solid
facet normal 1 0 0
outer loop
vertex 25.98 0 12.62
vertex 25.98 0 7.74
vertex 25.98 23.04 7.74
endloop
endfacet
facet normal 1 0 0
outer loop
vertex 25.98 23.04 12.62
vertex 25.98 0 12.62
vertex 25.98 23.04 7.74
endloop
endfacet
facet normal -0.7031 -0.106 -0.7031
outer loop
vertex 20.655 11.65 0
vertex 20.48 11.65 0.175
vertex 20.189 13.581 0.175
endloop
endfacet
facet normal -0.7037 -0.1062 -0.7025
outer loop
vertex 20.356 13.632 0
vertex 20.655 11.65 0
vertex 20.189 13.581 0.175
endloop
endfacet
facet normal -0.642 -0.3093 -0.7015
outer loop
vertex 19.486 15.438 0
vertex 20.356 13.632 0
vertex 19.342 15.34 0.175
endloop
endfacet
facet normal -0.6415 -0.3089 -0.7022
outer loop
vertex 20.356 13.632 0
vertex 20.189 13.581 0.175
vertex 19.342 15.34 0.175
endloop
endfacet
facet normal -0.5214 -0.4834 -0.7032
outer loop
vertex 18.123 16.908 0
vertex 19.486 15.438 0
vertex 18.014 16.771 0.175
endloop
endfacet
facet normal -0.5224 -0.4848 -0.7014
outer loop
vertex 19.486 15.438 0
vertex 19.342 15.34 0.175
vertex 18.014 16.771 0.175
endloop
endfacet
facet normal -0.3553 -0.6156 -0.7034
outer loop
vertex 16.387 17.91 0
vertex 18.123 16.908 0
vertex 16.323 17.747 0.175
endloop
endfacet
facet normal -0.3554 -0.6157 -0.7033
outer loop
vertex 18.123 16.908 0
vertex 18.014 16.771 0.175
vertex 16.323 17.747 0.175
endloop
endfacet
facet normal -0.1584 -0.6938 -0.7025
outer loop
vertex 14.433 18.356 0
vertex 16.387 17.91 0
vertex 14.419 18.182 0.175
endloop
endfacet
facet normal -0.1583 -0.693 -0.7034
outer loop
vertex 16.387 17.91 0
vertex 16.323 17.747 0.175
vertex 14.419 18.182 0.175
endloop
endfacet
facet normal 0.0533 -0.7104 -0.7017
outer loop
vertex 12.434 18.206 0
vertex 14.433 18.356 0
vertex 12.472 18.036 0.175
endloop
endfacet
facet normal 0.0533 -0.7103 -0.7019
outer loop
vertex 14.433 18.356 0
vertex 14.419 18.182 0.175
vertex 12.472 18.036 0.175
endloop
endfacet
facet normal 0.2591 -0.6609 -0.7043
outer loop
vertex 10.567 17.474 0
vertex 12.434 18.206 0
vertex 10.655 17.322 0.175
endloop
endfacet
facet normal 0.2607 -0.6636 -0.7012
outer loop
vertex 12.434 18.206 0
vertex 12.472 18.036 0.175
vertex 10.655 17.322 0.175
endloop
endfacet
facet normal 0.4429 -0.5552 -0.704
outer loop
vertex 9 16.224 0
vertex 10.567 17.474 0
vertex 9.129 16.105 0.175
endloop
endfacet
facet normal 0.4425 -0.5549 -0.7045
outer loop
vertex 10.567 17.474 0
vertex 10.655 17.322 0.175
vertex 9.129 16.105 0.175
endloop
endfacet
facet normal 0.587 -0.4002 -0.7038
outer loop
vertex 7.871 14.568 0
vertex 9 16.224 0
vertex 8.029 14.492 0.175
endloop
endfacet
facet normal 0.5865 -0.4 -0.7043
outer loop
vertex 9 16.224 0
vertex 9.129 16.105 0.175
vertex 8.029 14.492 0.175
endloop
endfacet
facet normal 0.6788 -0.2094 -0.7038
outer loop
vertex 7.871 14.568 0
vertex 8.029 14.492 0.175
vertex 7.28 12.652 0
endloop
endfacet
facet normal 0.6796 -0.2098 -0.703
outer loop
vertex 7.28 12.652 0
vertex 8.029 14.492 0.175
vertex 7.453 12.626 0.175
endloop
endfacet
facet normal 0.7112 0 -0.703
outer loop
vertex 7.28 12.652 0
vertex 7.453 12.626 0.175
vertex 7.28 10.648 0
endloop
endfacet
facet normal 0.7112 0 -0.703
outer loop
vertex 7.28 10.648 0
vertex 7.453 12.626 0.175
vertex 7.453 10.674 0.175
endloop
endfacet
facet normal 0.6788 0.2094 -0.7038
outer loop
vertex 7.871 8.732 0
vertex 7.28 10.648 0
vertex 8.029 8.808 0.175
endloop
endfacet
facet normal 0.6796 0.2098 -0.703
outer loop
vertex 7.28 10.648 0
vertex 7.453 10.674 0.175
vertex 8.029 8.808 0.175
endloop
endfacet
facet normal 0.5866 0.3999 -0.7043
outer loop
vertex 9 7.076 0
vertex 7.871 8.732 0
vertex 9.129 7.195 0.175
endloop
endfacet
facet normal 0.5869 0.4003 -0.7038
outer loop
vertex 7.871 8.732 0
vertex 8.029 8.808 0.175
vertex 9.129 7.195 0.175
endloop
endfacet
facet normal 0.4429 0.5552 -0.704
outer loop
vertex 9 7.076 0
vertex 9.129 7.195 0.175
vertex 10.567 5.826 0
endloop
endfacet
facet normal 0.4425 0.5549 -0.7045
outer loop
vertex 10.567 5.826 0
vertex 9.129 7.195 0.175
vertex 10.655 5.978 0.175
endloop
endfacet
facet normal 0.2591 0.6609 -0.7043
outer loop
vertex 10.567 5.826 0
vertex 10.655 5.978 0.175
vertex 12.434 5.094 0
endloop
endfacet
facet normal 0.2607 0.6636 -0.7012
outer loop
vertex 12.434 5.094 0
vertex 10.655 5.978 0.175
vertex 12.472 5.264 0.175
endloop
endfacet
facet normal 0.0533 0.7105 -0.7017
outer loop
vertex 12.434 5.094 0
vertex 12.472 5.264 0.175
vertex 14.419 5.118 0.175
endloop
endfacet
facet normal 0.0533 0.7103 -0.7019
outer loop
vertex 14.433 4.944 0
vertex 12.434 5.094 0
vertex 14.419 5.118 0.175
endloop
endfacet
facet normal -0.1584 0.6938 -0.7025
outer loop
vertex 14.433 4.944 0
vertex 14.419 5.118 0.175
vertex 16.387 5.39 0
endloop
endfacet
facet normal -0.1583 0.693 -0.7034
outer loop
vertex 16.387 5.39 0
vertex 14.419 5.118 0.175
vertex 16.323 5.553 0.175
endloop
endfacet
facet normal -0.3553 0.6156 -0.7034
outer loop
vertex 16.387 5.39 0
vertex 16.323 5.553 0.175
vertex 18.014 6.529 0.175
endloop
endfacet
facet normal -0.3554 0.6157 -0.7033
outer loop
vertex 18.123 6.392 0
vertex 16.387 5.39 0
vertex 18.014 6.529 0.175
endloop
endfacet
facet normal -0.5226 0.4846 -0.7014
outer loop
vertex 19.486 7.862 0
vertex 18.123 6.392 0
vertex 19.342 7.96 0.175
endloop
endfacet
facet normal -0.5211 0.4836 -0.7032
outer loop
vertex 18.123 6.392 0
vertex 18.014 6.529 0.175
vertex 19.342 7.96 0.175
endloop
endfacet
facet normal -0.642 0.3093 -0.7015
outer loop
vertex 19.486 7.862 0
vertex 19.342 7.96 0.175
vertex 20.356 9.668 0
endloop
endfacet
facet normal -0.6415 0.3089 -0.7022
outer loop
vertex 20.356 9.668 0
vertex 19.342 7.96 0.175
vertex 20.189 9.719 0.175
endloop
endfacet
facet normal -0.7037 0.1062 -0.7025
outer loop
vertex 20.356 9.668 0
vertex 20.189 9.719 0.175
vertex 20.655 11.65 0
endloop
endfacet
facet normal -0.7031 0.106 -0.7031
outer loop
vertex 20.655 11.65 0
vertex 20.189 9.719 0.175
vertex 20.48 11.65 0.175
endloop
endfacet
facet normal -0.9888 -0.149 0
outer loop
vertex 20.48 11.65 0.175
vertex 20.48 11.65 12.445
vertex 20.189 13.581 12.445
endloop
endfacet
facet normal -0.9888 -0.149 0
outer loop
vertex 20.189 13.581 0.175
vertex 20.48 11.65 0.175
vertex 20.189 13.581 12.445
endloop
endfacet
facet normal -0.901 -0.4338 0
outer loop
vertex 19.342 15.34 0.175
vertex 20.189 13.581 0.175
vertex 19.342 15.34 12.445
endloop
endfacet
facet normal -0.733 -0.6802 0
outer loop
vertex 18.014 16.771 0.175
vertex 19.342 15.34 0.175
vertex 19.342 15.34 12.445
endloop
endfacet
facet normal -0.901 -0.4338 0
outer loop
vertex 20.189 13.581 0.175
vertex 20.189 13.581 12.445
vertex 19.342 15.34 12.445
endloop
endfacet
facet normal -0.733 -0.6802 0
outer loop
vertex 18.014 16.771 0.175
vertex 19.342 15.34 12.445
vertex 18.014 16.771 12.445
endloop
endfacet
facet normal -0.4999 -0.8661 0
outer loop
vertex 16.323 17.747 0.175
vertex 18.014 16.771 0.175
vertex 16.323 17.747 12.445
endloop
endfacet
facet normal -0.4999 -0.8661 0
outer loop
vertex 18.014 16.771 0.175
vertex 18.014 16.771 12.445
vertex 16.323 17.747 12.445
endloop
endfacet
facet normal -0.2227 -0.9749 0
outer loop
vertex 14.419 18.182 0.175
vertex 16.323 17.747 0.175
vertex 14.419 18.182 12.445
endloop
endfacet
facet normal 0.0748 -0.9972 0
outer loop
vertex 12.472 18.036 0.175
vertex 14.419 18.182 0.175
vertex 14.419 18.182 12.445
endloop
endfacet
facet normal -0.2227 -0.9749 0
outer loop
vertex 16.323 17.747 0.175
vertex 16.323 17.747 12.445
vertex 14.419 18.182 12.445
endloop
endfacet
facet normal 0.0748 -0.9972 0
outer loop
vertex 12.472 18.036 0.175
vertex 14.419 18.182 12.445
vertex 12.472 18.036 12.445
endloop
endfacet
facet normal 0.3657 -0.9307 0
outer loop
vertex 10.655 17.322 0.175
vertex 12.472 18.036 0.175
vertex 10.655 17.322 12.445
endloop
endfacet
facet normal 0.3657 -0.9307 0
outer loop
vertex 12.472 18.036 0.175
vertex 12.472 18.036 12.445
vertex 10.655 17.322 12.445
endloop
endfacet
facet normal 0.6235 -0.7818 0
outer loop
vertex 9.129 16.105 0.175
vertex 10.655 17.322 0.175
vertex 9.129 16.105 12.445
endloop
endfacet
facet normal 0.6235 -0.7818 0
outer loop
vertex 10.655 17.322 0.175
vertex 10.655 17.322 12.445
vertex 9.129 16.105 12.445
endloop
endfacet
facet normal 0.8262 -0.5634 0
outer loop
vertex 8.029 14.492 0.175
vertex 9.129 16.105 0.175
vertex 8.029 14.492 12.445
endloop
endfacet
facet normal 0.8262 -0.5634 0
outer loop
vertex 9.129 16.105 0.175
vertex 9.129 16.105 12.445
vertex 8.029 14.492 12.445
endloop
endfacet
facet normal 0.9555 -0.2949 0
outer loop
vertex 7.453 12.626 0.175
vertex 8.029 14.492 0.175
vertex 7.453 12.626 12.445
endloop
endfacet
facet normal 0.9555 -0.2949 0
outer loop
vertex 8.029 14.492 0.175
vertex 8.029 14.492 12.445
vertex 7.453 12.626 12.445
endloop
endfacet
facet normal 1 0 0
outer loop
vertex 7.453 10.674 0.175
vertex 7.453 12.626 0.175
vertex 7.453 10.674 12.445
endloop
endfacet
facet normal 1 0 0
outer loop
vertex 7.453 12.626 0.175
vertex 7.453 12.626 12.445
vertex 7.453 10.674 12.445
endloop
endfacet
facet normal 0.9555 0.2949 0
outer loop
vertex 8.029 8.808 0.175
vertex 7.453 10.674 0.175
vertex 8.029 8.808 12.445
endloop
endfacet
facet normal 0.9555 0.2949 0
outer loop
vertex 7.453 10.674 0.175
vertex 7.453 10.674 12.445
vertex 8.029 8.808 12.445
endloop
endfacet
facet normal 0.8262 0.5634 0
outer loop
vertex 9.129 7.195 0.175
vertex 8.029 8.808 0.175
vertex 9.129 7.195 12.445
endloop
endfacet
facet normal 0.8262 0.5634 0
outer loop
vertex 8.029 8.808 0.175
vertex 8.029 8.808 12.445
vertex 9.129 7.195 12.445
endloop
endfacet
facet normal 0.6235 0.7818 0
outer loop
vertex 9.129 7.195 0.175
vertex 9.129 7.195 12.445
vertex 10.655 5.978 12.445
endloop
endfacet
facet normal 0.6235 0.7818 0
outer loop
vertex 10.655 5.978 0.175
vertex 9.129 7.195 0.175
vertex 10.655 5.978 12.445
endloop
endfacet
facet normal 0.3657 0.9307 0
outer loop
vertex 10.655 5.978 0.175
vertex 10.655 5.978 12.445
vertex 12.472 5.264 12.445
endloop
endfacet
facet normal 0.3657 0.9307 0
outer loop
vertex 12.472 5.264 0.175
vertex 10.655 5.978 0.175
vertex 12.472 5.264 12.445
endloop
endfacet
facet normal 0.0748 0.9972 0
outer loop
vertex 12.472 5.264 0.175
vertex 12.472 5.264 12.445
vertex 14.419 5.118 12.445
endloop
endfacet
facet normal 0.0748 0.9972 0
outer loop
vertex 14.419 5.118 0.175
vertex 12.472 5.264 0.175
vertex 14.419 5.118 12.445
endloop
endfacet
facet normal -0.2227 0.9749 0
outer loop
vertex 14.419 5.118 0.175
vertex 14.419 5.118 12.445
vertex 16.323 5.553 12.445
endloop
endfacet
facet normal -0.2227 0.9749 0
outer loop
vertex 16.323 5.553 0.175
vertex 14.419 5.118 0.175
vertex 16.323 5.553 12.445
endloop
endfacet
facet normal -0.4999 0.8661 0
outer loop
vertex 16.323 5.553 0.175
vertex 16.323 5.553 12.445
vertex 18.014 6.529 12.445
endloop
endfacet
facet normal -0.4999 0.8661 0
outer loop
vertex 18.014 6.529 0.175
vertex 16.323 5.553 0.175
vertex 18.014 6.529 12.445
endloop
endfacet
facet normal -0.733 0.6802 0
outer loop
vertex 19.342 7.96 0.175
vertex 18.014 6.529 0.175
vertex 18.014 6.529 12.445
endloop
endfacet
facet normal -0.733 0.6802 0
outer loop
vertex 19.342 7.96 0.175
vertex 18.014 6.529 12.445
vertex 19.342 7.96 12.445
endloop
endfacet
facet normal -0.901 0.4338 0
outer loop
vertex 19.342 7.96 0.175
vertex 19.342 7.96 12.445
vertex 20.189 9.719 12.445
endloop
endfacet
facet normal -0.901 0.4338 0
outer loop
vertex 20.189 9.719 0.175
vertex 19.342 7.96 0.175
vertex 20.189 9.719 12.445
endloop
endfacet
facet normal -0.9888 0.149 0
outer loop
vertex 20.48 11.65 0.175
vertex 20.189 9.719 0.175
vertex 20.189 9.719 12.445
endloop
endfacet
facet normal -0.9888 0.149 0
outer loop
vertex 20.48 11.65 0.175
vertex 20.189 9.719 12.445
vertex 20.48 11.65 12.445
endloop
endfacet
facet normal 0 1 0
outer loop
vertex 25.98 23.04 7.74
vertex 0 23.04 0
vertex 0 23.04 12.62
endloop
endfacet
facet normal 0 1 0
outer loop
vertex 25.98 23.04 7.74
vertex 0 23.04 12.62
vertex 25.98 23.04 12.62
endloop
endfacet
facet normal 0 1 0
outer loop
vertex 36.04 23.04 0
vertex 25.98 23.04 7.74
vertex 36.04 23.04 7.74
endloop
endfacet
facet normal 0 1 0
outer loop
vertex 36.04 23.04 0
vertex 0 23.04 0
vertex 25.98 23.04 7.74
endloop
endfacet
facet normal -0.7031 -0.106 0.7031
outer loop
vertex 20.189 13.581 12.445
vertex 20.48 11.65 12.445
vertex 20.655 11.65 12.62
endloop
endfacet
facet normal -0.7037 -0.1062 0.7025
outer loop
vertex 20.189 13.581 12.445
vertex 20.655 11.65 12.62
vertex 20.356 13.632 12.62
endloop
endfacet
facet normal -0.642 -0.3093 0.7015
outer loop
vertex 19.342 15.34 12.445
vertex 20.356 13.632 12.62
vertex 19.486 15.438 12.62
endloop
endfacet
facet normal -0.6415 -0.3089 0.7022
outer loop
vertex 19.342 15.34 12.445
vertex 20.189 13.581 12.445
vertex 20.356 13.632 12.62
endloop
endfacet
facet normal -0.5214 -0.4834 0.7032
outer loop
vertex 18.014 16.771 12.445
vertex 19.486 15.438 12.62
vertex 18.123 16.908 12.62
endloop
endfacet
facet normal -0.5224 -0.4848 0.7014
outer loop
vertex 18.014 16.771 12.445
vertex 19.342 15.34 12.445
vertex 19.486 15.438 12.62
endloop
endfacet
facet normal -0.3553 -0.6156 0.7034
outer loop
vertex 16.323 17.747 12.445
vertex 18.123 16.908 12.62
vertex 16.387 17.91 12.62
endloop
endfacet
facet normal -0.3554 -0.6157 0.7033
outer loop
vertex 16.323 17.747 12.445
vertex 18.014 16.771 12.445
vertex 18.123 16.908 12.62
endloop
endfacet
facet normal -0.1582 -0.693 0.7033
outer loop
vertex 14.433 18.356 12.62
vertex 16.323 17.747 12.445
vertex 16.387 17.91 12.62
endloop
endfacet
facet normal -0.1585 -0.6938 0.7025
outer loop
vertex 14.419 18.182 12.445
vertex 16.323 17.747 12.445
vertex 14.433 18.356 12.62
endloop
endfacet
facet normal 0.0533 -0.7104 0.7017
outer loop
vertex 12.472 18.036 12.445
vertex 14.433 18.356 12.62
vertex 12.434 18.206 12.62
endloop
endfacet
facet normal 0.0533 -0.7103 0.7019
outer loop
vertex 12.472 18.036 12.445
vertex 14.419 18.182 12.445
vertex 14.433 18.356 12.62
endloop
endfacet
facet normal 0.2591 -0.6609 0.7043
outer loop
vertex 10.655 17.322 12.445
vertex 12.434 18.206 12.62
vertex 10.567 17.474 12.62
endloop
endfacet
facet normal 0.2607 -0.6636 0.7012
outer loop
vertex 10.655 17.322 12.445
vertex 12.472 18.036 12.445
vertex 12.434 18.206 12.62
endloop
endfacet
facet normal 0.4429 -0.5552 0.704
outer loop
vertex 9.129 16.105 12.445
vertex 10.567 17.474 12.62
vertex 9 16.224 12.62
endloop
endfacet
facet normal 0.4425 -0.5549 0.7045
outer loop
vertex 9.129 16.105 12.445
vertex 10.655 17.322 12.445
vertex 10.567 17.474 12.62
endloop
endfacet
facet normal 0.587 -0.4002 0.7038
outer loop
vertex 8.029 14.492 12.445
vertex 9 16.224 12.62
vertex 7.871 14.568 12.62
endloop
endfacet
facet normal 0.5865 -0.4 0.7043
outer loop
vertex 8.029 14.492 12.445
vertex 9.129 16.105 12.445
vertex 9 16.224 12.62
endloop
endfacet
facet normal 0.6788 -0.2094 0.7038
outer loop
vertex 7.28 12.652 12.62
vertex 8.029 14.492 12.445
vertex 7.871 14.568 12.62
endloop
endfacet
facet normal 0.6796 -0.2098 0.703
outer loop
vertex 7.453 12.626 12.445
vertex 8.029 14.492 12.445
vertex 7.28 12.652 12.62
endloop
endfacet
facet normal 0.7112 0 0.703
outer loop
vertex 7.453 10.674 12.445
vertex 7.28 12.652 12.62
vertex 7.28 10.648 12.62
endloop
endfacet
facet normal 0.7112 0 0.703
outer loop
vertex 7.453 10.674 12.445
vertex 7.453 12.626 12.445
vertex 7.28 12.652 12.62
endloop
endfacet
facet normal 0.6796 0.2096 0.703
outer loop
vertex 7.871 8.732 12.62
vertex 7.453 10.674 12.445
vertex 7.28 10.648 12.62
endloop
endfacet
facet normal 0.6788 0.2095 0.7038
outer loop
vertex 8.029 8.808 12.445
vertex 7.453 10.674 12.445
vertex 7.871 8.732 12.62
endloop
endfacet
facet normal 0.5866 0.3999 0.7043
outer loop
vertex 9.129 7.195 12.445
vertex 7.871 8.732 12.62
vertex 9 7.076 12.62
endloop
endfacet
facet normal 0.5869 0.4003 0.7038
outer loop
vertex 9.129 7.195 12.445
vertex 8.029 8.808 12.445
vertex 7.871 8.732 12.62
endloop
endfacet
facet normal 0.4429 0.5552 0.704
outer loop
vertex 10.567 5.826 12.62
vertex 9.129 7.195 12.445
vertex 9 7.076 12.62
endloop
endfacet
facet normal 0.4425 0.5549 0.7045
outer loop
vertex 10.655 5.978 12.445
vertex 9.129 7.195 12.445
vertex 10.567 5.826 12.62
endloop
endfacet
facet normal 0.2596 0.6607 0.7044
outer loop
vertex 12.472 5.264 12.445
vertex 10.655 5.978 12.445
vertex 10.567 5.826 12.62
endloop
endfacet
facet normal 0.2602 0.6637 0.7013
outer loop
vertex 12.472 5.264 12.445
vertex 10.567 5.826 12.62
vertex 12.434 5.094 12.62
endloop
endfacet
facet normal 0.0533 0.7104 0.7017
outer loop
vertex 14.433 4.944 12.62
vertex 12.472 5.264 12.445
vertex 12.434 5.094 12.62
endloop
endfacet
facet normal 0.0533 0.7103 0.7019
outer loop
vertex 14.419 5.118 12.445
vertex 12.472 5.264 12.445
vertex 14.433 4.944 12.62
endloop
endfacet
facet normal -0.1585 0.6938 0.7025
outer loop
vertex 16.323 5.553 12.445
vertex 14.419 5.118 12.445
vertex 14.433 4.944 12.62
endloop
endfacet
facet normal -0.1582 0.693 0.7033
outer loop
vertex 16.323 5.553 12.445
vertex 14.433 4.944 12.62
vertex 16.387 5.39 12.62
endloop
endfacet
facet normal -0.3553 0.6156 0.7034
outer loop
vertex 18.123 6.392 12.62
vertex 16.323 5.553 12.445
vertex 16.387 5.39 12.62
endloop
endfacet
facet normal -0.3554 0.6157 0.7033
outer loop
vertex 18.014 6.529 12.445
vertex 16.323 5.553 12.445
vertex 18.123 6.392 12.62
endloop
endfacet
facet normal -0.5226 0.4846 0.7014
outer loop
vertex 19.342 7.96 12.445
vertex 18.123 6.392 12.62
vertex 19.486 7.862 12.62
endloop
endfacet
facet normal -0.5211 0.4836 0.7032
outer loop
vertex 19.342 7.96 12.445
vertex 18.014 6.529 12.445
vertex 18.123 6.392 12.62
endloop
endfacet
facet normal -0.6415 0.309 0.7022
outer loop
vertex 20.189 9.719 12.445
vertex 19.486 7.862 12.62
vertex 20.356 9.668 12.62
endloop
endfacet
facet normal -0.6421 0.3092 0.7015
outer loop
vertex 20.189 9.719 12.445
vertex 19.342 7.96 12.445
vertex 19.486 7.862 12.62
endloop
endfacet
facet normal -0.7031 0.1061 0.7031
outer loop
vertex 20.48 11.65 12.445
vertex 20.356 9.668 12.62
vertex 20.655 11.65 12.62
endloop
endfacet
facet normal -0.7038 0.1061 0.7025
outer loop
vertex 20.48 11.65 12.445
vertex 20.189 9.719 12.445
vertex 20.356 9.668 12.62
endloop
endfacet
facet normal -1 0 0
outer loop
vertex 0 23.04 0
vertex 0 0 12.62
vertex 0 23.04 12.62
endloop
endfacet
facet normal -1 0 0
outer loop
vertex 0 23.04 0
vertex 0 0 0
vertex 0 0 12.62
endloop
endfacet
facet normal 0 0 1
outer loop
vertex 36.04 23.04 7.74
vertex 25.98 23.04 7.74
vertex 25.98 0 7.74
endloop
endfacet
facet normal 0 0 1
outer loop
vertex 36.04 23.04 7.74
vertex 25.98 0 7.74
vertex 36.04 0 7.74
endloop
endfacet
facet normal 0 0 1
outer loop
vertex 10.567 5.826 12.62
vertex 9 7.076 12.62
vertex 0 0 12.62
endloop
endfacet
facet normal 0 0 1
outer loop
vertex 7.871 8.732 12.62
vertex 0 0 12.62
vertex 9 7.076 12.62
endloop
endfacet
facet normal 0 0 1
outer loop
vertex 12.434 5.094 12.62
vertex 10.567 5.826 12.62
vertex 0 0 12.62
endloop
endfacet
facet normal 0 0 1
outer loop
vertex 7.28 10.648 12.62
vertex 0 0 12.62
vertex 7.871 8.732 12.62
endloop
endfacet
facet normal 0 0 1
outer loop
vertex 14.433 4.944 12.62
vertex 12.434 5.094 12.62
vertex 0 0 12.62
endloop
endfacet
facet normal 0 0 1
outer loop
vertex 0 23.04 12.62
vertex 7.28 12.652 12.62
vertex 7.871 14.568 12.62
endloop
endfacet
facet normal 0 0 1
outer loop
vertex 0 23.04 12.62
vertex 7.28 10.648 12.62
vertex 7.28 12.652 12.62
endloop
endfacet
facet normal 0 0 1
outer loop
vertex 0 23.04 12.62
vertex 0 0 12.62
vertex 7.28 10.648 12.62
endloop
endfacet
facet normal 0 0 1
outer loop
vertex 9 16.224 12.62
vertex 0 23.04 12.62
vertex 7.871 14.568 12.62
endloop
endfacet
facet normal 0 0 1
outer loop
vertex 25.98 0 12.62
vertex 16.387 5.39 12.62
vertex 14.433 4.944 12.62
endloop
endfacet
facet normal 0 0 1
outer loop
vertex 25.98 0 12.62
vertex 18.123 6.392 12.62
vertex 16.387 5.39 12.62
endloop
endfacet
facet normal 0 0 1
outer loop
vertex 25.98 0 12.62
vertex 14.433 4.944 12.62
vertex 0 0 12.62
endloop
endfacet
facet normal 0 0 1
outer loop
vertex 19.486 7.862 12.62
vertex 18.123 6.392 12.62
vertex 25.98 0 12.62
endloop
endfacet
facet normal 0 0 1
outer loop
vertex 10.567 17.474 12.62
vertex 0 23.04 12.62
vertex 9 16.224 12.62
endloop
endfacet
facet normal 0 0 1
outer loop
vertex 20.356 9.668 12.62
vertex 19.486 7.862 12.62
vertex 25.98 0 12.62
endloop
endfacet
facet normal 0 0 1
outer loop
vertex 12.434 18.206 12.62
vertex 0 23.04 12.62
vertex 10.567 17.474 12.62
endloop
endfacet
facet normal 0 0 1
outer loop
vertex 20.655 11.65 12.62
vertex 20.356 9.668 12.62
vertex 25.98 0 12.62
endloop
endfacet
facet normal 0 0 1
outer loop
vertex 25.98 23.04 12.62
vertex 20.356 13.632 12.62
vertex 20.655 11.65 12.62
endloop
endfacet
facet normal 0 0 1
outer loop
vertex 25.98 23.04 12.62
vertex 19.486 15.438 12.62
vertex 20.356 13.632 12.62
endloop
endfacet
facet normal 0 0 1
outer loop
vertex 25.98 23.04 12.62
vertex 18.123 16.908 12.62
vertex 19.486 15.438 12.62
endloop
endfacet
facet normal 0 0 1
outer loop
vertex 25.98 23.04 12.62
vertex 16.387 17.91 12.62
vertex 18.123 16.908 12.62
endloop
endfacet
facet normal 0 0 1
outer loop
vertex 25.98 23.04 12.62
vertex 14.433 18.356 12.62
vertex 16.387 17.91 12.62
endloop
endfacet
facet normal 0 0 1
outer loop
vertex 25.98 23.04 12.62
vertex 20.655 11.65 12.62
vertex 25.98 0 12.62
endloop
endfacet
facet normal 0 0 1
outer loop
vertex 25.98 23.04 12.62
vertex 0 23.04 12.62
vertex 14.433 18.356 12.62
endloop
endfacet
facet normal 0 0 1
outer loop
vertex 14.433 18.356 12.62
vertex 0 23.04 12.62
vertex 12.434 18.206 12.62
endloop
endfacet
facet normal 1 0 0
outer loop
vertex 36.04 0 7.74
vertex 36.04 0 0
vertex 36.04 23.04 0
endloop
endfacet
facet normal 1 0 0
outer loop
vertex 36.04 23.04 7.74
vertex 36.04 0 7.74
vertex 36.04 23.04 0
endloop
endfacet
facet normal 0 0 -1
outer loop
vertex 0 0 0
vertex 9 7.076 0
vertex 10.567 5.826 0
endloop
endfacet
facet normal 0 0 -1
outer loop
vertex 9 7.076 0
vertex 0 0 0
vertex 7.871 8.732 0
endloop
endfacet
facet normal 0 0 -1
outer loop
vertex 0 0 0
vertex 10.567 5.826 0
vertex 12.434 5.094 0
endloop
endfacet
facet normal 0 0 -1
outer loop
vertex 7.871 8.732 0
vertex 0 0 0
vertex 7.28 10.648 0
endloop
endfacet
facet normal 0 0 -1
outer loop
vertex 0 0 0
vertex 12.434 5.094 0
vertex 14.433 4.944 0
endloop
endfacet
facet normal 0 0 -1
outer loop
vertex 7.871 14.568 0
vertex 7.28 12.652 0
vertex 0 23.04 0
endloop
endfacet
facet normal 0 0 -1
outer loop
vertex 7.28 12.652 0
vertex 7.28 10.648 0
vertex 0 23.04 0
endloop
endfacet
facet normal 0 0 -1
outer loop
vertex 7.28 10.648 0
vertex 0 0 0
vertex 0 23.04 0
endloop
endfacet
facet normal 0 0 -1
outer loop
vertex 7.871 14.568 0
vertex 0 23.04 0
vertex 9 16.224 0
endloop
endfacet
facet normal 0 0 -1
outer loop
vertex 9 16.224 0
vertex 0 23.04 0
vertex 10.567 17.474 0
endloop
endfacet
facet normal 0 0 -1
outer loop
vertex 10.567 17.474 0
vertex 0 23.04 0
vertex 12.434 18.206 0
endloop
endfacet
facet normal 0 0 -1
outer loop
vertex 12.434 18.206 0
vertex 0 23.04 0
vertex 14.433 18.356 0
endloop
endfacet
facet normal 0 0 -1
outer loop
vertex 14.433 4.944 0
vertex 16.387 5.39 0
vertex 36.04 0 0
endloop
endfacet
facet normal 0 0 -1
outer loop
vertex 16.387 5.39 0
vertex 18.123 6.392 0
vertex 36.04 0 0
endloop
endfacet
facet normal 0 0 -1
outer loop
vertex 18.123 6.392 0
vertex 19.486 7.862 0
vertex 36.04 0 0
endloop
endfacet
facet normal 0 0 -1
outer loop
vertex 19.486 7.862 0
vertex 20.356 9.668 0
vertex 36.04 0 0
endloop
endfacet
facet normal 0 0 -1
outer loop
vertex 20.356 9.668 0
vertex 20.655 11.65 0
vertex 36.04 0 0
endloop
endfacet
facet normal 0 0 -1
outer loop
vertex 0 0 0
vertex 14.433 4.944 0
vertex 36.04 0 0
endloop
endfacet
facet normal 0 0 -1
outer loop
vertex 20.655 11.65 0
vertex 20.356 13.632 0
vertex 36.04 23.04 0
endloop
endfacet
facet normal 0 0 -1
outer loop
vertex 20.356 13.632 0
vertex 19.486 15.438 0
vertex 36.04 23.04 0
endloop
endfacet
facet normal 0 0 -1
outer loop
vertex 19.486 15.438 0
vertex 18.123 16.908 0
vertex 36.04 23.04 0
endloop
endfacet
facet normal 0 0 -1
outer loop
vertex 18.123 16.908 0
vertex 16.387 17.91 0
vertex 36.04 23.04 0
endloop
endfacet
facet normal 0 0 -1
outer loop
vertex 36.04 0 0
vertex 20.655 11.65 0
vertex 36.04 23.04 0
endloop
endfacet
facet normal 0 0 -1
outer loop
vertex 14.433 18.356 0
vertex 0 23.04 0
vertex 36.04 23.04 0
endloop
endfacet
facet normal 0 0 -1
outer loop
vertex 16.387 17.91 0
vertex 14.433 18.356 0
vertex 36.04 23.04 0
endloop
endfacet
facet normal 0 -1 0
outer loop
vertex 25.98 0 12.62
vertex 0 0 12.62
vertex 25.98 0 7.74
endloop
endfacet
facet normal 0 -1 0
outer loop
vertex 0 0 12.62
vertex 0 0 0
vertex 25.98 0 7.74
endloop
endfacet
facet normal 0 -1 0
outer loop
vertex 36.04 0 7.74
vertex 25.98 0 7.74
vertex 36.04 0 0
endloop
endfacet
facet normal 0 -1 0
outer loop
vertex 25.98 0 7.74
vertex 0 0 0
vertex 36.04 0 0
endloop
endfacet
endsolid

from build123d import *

# Parameters (mm, degrees)
F0_W     = 36.04
F0_H     = 23.04
F1_DEPTH = 7.74
F2_W     = 25.98
F2_H     = 23.04
F3_DEPTH = 4.88
F4_R     = 6.55
F5_DEPTH = 12.621
F6_SIZE2 = 0.175
F6_SIZE  = 0.175


with BuildPart() as f1:
    # F0 (on Top) → F1 (new body)
    with BuildSketch(Plane.XY):
        with Locations((18.02, 11.52)):
            Rectangle(F0_W, F0_H)
    extrude(amount=F1_DEPTH)

    # F2 (on face) → F3 (join)
    with BuildSketch(Plane.XY.offset(7.74)):
        with Locations((12.99, 11.52)):
            Rectangle(F2_W, F2_H)
    extrude(amount=F3_DEPTH)

    # F4 (on face) → F5 (cut, through all)
    with BuildSketch(Plane.XY.offset(12.62)):
        with Locations((13.93, 11.65)):
            Circle(F4_R)
    extrude(amount=-F5_DEPTH, mode=Mode.SUBTRACT)

    # F6
    f6_edges = [f1.edges().sort_by_distance(p)[0] for p in [
        (7.38, 11.65, 12.62),
        (7.38, 11.65, 0),
    ]]
    chamfer(f6_edges, length=F6_SIZE, length2=F6_SIZE2)


solid = f1.part
